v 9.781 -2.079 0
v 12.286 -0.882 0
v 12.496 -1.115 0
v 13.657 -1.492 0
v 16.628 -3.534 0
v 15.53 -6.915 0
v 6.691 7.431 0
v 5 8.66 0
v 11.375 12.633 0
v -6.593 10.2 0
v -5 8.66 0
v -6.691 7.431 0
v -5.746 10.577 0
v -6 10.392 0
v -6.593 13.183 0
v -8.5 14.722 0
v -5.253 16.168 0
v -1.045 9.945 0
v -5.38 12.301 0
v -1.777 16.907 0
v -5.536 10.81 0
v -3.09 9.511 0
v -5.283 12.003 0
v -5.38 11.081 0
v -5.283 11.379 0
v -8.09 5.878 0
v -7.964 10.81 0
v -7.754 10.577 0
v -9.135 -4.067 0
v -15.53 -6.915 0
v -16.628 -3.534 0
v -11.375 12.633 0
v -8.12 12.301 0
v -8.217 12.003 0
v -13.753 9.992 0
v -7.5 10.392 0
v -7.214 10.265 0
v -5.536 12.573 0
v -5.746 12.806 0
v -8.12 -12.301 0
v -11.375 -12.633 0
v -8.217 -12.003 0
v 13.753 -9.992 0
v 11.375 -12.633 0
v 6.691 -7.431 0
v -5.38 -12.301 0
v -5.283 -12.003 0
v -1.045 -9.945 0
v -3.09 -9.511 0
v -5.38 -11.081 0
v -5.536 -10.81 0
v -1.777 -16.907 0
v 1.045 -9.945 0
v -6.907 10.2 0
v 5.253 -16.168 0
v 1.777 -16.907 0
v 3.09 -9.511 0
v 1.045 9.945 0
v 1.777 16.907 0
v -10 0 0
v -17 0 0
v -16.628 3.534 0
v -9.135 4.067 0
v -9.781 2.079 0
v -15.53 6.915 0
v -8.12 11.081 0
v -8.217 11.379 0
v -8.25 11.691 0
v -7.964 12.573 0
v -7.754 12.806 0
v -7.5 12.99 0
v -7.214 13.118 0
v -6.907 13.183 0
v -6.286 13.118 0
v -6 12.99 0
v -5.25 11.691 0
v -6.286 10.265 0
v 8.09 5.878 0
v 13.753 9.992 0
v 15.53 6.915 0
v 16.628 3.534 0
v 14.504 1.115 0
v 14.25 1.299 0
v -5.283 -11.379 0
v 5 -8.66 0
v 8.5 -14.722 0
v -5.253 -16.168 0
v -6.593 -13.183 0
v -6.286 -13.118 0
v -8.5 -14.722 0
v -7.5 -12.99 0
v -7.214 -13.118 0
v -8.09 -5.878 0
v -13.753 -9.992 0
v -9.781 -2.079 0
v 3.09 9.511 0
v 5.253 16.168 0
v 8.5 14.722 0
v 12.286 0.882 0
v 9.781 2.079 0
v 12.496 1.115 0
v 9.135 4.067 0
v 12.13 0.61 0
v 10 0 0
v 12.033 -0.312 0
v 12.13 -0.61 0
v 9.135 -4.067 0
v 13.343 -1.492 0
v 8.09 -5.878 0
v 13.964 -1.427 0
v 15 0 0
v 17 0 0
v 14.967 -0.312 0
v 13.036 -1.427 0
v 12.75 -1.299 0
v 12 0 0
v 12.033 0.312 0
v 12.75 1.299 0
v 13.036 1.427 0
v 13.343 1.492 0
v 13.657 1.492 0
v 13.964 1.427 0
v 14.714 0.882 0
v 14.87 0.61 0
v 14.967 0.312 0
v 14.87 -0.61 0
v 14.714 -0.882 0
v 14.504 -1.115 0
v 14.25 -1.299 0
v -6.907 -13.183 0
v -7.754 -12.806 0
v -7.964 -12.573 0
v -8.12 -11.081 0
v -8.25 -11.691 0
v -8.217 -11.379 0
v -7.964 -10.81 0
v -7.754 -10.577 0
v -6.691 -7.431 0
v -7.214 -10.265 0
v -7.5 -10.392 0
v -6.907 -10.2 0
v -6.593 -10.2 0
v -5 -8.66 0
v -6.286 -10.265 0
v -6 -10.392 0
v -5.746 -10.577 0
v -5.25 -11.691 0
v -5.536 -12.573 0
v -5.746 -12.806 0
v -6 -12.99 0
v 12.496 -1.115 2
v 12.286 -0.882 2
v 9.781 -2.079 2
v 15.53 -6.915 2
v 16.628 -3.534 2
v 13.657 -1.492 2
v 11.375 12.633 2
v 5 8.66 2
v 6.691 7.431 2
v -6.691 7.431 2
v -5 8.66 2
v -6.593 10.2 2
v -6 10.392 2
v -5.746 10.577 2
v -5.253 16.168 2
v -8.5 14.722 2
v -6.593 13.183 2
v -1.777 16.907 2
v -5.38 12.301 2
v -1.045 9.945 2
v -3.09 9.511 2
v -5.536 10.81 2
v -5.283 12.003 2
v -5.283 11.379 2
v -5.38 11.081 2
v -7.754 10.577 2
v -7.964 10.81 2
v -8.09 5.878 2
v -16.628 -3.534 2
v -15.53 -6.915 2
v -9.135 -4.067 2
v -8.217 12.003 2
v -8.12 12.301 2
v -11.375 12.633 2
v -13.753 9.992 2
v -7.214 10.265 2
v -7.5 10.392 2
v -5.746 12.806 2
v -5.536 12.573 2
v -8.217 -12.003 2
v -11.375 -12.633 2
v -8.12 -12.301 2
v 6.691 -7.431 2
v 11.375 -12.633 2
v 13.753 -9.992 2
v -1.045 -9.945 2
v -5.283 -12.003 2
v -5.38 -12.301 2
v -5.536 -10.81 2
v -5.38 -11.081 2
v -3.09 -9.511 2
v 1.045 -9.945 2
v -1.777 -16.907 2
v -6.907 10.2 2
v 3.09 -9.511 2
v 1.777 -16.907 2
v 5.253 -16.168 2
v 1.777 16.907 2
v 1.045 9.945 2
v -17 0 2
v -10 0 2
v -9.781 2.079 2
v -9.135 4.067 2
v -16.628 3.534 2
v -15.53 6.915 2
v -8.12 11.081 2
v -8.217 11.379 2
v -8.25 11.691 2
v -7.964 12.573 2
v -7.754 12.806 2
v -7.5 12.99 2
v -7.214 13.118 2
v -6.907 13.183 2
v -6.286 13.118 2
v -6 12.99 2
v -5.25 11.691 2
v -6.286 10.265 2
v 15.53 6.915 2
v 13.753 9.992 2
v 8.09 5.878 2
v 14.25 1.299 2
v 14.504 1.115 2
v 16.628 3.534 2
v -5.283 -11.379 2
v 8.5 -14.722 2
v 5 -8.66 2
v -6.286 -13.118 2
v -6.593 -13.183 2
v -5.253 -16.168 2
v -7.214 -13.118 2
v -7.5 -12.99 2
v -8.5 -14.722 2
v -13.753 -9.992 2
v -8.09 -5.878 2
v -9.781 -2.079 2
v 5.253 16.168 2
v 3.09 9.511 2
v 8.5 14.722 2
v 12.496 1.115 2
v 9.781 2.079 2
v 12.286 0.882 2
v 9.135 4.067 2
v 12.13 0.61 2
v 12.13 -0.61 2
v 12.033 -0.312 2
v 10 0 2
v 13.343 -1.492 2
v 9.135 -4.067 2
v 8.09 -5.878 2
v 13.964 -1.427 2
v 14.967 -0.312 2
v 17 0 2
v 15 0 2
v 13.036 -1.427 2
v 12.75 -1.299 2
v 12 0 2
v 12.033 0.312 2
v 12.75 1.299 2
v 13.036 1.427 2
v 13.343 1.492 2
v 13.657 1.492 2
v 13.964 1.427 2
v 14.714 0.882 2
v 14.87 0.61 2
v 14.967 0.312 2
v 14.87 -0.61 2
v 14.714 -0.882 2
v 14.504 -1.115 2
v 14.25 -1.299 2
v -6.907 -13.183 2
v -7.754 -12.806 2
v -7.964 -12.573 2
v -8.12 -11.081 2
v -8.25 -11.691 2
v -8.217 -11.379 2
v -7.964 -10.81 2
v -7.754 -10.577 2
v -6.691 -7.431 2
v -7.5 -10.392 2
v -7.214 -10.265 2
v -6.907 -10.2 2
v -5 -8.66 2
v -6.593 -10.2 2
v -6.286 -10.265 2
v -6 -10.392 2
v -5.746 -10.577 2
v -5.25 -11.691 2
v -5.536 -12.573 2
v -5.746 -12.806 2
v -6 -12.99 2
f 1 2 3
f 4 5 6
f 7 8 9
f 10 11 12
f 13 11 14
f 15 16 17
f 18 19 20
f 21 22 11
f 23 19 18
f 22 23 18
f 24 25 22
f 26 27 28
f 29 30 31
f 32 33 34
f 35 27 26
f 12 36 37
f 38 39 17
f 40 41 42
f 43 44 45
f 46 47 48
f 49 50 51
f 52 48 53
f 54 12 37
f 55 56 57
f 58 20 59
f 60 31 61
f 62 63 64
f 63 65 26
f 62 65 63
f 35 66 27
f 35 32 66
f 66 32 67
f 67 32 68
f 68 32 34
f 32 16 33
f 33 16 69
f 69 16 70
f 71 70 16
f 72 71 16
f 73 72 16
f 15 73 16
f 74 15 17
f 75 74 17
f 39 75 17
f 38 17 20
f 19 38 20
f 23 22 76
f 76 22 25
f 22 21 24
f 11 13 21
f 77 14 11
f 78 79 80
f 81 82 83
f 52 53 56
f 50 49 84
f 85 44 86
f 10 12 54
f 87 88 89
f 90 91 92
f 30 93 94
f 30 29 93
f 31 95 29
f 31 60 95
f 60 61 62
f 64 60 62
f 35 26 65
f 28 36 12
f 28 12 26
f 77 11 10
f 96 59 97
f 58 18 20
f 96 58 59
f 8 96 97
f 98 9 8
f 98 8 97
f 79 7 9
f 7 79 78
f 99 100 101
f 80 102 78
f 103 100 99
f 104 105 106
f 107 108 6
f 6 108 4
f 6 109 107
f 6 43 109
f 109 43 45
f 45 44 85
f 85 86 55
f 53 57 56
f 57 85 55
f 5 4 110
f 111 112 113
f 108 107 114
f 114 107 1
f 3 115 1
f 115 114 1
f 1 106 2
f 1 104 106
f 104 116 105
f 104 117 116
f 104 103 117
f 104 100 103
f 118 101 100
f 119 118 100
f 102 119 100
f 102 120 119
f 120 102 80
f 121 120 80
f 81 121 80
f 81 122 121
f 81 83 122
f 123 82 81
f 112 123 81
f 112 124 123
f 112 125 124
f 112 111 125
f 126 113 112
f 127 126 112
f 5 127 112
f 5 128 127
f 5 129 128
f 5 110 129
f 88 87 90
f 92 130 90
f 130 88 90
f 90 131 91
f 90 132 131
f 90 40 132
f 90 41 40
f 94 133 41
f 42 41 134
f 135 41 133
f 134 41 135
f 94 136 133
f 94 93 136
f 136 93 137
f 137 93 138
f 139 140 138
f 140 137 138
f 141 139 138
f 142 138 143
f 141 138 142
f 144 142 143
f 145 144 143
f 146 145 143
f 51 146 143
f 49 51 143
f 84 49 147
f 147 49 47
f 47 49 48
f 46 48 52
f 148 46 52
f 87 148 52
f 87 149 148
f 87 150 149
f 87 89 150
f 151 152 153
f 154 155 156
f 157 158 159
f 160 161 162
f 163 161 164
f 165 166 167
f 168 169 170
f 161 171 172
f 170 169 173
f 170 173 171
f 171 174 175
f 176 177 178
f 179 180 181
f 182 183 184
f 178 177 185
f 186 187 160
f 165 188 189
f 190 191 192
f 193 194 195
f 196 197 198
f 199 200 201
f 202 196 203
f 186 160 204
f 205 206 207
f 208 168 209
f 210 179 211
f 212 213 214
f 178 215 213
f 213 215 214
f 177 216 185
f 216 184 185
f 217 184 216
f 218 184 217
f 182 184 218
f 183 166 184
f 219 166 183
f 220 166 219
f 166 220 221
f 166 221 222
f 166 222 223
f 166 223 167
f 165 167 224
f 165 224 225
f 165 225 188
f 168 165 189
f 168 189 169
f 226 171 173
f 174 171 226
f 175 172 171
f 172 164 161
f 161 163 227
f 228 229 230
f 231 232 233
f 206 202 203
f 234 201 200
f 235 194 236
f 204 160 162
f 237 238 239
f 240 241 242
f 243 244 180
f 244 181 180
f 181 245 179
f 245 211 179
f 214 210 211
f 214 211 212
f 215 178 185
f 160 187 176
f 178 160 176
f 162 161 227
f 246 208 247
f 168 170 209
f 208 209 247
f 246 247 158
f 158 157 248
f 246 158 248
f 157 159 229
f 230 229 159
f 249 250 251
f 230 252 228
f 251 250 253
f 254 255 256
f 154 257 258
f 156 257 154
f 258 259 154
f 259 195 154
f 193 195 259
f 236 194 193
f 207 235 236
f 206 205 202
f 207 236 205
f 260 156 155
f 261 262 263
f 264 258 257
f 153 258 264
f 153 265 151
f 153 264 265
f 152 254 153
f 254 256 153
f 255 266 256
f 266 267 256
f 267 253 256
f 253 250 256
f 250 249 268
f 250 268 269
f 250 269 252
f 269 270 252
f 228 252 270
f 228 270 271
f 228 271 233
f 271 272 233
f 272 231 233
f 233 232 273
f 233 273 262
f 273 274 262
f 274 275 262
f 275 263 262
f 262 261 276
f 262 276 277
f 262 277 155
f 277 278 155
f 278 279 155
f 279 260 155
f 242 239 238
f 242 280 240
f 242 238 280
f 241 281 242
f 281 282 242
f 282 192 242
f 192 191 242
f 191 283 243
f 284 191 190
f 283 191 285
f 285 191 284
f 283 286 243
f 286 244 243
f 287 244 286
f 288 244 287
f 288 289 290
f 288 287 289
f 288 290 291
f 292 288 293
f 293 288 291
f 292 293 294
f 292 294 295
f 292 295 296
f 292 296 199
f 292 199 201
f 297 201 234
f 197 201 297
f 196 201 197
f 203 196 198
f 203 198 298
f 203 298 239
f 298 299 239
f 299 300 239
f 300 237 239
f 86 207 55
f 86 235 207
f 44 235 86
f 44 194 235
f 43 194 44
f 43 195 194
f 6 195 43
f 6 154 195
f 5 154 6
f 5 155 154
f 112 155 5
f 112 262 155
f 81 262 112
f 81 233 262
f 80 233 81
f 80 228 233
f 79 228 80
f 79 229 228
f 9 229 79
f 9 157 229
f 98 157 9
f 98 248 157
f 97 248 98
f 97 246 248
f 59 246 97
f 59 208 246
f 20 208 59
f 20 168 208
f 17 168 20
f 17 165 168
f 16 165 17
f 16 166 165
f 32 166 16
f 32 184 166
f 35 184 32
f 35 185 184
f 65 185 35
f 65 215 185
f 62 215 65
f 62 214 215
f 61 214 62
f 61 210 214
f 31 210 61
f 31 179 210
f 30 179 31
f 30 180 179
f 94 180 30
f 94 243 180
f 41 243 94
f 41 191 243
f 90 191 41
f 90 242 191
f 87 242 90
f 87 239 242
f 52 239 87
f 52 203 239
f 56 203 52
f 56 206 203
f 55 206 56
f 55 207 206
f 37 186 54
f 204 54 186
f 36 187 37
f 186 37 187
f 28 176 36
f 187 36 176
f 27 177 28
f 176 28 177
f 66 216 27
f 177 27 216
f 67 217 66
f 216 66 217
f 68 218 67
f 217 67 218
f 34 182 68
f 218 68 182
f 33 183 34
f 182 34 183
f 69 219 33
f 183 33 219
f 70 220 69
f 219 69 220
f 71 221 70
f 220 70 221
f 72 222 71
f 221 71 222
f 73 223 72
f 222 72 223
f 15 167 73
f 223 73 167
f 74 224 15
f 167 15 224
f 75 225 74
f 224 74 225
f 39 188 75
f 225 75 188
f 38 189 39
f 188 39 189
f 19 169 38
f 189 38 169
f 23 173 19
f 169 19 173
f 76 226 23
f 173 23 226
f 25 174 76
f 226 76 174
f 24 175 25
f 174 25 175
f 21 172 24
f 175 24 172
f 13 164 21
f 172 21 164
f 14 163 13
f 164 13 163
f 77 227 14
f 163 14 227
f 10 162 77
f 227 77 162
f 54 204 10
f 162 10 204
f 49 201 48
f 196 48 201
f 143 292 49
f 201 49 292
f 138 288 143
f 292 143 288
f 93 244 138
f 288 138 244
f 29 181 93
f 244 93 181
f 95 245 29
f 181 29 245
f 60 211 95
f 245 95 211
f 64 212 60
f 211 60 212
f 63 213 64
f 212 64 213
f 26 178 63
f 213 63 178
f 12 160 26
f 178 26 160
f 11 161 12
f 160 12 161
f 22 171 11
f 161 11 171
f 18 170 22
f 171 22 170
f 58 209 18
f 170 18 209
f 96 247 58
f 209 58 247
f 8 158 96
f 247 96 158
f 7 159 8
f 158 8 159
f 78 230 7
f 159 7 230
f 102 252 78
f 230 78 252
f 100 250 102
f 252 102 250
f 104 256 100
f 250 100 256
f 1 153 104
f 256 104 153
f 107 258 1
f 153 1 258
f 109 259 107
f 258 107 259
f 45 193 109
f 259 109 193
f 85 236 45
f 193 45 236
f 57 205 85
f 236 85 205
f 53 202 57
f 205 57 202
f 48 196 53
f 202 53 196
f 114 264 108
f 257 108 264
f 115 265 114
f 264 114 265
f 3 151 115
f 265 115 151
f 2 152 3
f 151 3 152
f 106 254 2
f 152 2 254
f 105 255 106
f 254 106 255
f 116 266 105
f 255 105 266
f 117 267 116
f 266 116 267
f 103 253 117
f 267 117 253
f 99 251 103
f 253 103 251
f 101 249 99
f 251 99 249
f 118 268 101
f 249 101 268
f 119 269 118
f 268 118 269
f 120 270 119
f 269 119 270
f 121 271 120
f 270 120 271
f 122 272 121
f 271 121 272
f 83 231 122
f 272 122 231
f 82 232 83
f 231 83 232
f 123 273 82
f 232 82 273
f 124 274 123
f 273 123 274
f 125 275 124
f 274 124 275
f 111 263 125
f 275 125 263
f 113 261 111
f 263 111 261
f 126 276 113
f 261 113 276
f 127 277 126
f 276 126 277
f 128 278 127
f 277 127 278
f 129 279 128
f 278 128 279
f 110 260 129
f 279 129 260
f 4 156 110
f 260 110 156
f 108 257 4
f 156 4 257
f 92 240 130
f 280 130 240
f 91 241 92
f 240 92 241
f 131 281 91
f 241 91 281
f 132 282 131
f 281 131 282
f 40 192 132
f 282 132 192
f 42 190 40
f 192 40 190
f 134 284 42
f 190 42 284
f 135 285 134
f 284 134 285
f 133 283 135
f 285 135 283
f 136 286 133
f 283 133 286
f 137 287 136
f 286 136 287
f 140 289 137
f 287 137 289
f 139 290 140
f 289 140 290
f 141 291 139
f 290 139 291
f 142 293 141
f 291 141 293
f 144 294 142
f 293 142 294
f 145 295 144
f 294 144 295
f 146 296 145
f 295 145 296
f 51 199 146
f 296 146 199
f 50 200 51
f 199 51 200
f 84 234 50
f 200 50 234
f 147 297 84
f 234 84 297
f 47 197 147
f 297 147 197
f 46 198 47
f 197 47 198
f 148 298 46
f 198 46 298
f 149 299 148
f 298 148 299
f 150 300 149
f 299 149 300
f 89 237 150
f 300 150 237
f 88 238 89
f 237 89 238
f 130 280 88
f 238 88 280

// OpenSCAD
function screw_coords(d, r) = [cos(d)*r, sin(d)*r];

module adapter_plate(d=20, h=2, spacing=2, screw_dia=3,screw_num=3) {
    inner_dia = d;
    outer_dia = inner_dia + spacing*4 + screw_dia*2;
    screw_angle = 360 / screw_num;
    screw_radius = inner_dia/2 + spacing + screw_dia/2;
    linear_extrude(h){
        difference() {
            circle(d=outer_dia, $fn=30);
            circle(d=inner_dia, $fn=30);
            if(screw_num > 0){
                for( i = [0 : screw_num-1] ){
                    translate(screw_coords(i*screw_angle, screw_radius)) circle(d=screw_dia, $fn=30);
                }
            }
        }
    }
}

module adapter_drill(d=20, h=20, spacing=2, screw_dia=3, screw_num=3) {
    inner_dia = d;
    outer_dia = inner_dia + spacing*4 + screw_dia*2;
    screw_angle = 360 / screw_num;
    screw_radius = inner_dia/2 + spacing + screw_dia/2;
    linear_extrude(h) {
        circle(d=inner_dia, $fn=30);
        if(screw_num > 0){
            for( i = [0: screw_num-1] ){
                translate(screw_coords(i*screw_angle, screw_radius)) circle(d=screw_dia, $fn=30);
            }
        }
    }
}

d=6;
screw_num=2;
screw_dia=1.8;

//adapter_plate(d=d, screw_num=screw_num, screw_dia=screw_dia);
//adapter_drill(d=d, screw_num=screw_num, screw_dia=screw_dia);
adapter_plate();

// upper: screw_num=4, screw_dia=2.8, d=20
// bottom: screw_num=4, screw_dia=2.8, d=20
// side: screw_num=2, d=6, screw_dia=1.8
